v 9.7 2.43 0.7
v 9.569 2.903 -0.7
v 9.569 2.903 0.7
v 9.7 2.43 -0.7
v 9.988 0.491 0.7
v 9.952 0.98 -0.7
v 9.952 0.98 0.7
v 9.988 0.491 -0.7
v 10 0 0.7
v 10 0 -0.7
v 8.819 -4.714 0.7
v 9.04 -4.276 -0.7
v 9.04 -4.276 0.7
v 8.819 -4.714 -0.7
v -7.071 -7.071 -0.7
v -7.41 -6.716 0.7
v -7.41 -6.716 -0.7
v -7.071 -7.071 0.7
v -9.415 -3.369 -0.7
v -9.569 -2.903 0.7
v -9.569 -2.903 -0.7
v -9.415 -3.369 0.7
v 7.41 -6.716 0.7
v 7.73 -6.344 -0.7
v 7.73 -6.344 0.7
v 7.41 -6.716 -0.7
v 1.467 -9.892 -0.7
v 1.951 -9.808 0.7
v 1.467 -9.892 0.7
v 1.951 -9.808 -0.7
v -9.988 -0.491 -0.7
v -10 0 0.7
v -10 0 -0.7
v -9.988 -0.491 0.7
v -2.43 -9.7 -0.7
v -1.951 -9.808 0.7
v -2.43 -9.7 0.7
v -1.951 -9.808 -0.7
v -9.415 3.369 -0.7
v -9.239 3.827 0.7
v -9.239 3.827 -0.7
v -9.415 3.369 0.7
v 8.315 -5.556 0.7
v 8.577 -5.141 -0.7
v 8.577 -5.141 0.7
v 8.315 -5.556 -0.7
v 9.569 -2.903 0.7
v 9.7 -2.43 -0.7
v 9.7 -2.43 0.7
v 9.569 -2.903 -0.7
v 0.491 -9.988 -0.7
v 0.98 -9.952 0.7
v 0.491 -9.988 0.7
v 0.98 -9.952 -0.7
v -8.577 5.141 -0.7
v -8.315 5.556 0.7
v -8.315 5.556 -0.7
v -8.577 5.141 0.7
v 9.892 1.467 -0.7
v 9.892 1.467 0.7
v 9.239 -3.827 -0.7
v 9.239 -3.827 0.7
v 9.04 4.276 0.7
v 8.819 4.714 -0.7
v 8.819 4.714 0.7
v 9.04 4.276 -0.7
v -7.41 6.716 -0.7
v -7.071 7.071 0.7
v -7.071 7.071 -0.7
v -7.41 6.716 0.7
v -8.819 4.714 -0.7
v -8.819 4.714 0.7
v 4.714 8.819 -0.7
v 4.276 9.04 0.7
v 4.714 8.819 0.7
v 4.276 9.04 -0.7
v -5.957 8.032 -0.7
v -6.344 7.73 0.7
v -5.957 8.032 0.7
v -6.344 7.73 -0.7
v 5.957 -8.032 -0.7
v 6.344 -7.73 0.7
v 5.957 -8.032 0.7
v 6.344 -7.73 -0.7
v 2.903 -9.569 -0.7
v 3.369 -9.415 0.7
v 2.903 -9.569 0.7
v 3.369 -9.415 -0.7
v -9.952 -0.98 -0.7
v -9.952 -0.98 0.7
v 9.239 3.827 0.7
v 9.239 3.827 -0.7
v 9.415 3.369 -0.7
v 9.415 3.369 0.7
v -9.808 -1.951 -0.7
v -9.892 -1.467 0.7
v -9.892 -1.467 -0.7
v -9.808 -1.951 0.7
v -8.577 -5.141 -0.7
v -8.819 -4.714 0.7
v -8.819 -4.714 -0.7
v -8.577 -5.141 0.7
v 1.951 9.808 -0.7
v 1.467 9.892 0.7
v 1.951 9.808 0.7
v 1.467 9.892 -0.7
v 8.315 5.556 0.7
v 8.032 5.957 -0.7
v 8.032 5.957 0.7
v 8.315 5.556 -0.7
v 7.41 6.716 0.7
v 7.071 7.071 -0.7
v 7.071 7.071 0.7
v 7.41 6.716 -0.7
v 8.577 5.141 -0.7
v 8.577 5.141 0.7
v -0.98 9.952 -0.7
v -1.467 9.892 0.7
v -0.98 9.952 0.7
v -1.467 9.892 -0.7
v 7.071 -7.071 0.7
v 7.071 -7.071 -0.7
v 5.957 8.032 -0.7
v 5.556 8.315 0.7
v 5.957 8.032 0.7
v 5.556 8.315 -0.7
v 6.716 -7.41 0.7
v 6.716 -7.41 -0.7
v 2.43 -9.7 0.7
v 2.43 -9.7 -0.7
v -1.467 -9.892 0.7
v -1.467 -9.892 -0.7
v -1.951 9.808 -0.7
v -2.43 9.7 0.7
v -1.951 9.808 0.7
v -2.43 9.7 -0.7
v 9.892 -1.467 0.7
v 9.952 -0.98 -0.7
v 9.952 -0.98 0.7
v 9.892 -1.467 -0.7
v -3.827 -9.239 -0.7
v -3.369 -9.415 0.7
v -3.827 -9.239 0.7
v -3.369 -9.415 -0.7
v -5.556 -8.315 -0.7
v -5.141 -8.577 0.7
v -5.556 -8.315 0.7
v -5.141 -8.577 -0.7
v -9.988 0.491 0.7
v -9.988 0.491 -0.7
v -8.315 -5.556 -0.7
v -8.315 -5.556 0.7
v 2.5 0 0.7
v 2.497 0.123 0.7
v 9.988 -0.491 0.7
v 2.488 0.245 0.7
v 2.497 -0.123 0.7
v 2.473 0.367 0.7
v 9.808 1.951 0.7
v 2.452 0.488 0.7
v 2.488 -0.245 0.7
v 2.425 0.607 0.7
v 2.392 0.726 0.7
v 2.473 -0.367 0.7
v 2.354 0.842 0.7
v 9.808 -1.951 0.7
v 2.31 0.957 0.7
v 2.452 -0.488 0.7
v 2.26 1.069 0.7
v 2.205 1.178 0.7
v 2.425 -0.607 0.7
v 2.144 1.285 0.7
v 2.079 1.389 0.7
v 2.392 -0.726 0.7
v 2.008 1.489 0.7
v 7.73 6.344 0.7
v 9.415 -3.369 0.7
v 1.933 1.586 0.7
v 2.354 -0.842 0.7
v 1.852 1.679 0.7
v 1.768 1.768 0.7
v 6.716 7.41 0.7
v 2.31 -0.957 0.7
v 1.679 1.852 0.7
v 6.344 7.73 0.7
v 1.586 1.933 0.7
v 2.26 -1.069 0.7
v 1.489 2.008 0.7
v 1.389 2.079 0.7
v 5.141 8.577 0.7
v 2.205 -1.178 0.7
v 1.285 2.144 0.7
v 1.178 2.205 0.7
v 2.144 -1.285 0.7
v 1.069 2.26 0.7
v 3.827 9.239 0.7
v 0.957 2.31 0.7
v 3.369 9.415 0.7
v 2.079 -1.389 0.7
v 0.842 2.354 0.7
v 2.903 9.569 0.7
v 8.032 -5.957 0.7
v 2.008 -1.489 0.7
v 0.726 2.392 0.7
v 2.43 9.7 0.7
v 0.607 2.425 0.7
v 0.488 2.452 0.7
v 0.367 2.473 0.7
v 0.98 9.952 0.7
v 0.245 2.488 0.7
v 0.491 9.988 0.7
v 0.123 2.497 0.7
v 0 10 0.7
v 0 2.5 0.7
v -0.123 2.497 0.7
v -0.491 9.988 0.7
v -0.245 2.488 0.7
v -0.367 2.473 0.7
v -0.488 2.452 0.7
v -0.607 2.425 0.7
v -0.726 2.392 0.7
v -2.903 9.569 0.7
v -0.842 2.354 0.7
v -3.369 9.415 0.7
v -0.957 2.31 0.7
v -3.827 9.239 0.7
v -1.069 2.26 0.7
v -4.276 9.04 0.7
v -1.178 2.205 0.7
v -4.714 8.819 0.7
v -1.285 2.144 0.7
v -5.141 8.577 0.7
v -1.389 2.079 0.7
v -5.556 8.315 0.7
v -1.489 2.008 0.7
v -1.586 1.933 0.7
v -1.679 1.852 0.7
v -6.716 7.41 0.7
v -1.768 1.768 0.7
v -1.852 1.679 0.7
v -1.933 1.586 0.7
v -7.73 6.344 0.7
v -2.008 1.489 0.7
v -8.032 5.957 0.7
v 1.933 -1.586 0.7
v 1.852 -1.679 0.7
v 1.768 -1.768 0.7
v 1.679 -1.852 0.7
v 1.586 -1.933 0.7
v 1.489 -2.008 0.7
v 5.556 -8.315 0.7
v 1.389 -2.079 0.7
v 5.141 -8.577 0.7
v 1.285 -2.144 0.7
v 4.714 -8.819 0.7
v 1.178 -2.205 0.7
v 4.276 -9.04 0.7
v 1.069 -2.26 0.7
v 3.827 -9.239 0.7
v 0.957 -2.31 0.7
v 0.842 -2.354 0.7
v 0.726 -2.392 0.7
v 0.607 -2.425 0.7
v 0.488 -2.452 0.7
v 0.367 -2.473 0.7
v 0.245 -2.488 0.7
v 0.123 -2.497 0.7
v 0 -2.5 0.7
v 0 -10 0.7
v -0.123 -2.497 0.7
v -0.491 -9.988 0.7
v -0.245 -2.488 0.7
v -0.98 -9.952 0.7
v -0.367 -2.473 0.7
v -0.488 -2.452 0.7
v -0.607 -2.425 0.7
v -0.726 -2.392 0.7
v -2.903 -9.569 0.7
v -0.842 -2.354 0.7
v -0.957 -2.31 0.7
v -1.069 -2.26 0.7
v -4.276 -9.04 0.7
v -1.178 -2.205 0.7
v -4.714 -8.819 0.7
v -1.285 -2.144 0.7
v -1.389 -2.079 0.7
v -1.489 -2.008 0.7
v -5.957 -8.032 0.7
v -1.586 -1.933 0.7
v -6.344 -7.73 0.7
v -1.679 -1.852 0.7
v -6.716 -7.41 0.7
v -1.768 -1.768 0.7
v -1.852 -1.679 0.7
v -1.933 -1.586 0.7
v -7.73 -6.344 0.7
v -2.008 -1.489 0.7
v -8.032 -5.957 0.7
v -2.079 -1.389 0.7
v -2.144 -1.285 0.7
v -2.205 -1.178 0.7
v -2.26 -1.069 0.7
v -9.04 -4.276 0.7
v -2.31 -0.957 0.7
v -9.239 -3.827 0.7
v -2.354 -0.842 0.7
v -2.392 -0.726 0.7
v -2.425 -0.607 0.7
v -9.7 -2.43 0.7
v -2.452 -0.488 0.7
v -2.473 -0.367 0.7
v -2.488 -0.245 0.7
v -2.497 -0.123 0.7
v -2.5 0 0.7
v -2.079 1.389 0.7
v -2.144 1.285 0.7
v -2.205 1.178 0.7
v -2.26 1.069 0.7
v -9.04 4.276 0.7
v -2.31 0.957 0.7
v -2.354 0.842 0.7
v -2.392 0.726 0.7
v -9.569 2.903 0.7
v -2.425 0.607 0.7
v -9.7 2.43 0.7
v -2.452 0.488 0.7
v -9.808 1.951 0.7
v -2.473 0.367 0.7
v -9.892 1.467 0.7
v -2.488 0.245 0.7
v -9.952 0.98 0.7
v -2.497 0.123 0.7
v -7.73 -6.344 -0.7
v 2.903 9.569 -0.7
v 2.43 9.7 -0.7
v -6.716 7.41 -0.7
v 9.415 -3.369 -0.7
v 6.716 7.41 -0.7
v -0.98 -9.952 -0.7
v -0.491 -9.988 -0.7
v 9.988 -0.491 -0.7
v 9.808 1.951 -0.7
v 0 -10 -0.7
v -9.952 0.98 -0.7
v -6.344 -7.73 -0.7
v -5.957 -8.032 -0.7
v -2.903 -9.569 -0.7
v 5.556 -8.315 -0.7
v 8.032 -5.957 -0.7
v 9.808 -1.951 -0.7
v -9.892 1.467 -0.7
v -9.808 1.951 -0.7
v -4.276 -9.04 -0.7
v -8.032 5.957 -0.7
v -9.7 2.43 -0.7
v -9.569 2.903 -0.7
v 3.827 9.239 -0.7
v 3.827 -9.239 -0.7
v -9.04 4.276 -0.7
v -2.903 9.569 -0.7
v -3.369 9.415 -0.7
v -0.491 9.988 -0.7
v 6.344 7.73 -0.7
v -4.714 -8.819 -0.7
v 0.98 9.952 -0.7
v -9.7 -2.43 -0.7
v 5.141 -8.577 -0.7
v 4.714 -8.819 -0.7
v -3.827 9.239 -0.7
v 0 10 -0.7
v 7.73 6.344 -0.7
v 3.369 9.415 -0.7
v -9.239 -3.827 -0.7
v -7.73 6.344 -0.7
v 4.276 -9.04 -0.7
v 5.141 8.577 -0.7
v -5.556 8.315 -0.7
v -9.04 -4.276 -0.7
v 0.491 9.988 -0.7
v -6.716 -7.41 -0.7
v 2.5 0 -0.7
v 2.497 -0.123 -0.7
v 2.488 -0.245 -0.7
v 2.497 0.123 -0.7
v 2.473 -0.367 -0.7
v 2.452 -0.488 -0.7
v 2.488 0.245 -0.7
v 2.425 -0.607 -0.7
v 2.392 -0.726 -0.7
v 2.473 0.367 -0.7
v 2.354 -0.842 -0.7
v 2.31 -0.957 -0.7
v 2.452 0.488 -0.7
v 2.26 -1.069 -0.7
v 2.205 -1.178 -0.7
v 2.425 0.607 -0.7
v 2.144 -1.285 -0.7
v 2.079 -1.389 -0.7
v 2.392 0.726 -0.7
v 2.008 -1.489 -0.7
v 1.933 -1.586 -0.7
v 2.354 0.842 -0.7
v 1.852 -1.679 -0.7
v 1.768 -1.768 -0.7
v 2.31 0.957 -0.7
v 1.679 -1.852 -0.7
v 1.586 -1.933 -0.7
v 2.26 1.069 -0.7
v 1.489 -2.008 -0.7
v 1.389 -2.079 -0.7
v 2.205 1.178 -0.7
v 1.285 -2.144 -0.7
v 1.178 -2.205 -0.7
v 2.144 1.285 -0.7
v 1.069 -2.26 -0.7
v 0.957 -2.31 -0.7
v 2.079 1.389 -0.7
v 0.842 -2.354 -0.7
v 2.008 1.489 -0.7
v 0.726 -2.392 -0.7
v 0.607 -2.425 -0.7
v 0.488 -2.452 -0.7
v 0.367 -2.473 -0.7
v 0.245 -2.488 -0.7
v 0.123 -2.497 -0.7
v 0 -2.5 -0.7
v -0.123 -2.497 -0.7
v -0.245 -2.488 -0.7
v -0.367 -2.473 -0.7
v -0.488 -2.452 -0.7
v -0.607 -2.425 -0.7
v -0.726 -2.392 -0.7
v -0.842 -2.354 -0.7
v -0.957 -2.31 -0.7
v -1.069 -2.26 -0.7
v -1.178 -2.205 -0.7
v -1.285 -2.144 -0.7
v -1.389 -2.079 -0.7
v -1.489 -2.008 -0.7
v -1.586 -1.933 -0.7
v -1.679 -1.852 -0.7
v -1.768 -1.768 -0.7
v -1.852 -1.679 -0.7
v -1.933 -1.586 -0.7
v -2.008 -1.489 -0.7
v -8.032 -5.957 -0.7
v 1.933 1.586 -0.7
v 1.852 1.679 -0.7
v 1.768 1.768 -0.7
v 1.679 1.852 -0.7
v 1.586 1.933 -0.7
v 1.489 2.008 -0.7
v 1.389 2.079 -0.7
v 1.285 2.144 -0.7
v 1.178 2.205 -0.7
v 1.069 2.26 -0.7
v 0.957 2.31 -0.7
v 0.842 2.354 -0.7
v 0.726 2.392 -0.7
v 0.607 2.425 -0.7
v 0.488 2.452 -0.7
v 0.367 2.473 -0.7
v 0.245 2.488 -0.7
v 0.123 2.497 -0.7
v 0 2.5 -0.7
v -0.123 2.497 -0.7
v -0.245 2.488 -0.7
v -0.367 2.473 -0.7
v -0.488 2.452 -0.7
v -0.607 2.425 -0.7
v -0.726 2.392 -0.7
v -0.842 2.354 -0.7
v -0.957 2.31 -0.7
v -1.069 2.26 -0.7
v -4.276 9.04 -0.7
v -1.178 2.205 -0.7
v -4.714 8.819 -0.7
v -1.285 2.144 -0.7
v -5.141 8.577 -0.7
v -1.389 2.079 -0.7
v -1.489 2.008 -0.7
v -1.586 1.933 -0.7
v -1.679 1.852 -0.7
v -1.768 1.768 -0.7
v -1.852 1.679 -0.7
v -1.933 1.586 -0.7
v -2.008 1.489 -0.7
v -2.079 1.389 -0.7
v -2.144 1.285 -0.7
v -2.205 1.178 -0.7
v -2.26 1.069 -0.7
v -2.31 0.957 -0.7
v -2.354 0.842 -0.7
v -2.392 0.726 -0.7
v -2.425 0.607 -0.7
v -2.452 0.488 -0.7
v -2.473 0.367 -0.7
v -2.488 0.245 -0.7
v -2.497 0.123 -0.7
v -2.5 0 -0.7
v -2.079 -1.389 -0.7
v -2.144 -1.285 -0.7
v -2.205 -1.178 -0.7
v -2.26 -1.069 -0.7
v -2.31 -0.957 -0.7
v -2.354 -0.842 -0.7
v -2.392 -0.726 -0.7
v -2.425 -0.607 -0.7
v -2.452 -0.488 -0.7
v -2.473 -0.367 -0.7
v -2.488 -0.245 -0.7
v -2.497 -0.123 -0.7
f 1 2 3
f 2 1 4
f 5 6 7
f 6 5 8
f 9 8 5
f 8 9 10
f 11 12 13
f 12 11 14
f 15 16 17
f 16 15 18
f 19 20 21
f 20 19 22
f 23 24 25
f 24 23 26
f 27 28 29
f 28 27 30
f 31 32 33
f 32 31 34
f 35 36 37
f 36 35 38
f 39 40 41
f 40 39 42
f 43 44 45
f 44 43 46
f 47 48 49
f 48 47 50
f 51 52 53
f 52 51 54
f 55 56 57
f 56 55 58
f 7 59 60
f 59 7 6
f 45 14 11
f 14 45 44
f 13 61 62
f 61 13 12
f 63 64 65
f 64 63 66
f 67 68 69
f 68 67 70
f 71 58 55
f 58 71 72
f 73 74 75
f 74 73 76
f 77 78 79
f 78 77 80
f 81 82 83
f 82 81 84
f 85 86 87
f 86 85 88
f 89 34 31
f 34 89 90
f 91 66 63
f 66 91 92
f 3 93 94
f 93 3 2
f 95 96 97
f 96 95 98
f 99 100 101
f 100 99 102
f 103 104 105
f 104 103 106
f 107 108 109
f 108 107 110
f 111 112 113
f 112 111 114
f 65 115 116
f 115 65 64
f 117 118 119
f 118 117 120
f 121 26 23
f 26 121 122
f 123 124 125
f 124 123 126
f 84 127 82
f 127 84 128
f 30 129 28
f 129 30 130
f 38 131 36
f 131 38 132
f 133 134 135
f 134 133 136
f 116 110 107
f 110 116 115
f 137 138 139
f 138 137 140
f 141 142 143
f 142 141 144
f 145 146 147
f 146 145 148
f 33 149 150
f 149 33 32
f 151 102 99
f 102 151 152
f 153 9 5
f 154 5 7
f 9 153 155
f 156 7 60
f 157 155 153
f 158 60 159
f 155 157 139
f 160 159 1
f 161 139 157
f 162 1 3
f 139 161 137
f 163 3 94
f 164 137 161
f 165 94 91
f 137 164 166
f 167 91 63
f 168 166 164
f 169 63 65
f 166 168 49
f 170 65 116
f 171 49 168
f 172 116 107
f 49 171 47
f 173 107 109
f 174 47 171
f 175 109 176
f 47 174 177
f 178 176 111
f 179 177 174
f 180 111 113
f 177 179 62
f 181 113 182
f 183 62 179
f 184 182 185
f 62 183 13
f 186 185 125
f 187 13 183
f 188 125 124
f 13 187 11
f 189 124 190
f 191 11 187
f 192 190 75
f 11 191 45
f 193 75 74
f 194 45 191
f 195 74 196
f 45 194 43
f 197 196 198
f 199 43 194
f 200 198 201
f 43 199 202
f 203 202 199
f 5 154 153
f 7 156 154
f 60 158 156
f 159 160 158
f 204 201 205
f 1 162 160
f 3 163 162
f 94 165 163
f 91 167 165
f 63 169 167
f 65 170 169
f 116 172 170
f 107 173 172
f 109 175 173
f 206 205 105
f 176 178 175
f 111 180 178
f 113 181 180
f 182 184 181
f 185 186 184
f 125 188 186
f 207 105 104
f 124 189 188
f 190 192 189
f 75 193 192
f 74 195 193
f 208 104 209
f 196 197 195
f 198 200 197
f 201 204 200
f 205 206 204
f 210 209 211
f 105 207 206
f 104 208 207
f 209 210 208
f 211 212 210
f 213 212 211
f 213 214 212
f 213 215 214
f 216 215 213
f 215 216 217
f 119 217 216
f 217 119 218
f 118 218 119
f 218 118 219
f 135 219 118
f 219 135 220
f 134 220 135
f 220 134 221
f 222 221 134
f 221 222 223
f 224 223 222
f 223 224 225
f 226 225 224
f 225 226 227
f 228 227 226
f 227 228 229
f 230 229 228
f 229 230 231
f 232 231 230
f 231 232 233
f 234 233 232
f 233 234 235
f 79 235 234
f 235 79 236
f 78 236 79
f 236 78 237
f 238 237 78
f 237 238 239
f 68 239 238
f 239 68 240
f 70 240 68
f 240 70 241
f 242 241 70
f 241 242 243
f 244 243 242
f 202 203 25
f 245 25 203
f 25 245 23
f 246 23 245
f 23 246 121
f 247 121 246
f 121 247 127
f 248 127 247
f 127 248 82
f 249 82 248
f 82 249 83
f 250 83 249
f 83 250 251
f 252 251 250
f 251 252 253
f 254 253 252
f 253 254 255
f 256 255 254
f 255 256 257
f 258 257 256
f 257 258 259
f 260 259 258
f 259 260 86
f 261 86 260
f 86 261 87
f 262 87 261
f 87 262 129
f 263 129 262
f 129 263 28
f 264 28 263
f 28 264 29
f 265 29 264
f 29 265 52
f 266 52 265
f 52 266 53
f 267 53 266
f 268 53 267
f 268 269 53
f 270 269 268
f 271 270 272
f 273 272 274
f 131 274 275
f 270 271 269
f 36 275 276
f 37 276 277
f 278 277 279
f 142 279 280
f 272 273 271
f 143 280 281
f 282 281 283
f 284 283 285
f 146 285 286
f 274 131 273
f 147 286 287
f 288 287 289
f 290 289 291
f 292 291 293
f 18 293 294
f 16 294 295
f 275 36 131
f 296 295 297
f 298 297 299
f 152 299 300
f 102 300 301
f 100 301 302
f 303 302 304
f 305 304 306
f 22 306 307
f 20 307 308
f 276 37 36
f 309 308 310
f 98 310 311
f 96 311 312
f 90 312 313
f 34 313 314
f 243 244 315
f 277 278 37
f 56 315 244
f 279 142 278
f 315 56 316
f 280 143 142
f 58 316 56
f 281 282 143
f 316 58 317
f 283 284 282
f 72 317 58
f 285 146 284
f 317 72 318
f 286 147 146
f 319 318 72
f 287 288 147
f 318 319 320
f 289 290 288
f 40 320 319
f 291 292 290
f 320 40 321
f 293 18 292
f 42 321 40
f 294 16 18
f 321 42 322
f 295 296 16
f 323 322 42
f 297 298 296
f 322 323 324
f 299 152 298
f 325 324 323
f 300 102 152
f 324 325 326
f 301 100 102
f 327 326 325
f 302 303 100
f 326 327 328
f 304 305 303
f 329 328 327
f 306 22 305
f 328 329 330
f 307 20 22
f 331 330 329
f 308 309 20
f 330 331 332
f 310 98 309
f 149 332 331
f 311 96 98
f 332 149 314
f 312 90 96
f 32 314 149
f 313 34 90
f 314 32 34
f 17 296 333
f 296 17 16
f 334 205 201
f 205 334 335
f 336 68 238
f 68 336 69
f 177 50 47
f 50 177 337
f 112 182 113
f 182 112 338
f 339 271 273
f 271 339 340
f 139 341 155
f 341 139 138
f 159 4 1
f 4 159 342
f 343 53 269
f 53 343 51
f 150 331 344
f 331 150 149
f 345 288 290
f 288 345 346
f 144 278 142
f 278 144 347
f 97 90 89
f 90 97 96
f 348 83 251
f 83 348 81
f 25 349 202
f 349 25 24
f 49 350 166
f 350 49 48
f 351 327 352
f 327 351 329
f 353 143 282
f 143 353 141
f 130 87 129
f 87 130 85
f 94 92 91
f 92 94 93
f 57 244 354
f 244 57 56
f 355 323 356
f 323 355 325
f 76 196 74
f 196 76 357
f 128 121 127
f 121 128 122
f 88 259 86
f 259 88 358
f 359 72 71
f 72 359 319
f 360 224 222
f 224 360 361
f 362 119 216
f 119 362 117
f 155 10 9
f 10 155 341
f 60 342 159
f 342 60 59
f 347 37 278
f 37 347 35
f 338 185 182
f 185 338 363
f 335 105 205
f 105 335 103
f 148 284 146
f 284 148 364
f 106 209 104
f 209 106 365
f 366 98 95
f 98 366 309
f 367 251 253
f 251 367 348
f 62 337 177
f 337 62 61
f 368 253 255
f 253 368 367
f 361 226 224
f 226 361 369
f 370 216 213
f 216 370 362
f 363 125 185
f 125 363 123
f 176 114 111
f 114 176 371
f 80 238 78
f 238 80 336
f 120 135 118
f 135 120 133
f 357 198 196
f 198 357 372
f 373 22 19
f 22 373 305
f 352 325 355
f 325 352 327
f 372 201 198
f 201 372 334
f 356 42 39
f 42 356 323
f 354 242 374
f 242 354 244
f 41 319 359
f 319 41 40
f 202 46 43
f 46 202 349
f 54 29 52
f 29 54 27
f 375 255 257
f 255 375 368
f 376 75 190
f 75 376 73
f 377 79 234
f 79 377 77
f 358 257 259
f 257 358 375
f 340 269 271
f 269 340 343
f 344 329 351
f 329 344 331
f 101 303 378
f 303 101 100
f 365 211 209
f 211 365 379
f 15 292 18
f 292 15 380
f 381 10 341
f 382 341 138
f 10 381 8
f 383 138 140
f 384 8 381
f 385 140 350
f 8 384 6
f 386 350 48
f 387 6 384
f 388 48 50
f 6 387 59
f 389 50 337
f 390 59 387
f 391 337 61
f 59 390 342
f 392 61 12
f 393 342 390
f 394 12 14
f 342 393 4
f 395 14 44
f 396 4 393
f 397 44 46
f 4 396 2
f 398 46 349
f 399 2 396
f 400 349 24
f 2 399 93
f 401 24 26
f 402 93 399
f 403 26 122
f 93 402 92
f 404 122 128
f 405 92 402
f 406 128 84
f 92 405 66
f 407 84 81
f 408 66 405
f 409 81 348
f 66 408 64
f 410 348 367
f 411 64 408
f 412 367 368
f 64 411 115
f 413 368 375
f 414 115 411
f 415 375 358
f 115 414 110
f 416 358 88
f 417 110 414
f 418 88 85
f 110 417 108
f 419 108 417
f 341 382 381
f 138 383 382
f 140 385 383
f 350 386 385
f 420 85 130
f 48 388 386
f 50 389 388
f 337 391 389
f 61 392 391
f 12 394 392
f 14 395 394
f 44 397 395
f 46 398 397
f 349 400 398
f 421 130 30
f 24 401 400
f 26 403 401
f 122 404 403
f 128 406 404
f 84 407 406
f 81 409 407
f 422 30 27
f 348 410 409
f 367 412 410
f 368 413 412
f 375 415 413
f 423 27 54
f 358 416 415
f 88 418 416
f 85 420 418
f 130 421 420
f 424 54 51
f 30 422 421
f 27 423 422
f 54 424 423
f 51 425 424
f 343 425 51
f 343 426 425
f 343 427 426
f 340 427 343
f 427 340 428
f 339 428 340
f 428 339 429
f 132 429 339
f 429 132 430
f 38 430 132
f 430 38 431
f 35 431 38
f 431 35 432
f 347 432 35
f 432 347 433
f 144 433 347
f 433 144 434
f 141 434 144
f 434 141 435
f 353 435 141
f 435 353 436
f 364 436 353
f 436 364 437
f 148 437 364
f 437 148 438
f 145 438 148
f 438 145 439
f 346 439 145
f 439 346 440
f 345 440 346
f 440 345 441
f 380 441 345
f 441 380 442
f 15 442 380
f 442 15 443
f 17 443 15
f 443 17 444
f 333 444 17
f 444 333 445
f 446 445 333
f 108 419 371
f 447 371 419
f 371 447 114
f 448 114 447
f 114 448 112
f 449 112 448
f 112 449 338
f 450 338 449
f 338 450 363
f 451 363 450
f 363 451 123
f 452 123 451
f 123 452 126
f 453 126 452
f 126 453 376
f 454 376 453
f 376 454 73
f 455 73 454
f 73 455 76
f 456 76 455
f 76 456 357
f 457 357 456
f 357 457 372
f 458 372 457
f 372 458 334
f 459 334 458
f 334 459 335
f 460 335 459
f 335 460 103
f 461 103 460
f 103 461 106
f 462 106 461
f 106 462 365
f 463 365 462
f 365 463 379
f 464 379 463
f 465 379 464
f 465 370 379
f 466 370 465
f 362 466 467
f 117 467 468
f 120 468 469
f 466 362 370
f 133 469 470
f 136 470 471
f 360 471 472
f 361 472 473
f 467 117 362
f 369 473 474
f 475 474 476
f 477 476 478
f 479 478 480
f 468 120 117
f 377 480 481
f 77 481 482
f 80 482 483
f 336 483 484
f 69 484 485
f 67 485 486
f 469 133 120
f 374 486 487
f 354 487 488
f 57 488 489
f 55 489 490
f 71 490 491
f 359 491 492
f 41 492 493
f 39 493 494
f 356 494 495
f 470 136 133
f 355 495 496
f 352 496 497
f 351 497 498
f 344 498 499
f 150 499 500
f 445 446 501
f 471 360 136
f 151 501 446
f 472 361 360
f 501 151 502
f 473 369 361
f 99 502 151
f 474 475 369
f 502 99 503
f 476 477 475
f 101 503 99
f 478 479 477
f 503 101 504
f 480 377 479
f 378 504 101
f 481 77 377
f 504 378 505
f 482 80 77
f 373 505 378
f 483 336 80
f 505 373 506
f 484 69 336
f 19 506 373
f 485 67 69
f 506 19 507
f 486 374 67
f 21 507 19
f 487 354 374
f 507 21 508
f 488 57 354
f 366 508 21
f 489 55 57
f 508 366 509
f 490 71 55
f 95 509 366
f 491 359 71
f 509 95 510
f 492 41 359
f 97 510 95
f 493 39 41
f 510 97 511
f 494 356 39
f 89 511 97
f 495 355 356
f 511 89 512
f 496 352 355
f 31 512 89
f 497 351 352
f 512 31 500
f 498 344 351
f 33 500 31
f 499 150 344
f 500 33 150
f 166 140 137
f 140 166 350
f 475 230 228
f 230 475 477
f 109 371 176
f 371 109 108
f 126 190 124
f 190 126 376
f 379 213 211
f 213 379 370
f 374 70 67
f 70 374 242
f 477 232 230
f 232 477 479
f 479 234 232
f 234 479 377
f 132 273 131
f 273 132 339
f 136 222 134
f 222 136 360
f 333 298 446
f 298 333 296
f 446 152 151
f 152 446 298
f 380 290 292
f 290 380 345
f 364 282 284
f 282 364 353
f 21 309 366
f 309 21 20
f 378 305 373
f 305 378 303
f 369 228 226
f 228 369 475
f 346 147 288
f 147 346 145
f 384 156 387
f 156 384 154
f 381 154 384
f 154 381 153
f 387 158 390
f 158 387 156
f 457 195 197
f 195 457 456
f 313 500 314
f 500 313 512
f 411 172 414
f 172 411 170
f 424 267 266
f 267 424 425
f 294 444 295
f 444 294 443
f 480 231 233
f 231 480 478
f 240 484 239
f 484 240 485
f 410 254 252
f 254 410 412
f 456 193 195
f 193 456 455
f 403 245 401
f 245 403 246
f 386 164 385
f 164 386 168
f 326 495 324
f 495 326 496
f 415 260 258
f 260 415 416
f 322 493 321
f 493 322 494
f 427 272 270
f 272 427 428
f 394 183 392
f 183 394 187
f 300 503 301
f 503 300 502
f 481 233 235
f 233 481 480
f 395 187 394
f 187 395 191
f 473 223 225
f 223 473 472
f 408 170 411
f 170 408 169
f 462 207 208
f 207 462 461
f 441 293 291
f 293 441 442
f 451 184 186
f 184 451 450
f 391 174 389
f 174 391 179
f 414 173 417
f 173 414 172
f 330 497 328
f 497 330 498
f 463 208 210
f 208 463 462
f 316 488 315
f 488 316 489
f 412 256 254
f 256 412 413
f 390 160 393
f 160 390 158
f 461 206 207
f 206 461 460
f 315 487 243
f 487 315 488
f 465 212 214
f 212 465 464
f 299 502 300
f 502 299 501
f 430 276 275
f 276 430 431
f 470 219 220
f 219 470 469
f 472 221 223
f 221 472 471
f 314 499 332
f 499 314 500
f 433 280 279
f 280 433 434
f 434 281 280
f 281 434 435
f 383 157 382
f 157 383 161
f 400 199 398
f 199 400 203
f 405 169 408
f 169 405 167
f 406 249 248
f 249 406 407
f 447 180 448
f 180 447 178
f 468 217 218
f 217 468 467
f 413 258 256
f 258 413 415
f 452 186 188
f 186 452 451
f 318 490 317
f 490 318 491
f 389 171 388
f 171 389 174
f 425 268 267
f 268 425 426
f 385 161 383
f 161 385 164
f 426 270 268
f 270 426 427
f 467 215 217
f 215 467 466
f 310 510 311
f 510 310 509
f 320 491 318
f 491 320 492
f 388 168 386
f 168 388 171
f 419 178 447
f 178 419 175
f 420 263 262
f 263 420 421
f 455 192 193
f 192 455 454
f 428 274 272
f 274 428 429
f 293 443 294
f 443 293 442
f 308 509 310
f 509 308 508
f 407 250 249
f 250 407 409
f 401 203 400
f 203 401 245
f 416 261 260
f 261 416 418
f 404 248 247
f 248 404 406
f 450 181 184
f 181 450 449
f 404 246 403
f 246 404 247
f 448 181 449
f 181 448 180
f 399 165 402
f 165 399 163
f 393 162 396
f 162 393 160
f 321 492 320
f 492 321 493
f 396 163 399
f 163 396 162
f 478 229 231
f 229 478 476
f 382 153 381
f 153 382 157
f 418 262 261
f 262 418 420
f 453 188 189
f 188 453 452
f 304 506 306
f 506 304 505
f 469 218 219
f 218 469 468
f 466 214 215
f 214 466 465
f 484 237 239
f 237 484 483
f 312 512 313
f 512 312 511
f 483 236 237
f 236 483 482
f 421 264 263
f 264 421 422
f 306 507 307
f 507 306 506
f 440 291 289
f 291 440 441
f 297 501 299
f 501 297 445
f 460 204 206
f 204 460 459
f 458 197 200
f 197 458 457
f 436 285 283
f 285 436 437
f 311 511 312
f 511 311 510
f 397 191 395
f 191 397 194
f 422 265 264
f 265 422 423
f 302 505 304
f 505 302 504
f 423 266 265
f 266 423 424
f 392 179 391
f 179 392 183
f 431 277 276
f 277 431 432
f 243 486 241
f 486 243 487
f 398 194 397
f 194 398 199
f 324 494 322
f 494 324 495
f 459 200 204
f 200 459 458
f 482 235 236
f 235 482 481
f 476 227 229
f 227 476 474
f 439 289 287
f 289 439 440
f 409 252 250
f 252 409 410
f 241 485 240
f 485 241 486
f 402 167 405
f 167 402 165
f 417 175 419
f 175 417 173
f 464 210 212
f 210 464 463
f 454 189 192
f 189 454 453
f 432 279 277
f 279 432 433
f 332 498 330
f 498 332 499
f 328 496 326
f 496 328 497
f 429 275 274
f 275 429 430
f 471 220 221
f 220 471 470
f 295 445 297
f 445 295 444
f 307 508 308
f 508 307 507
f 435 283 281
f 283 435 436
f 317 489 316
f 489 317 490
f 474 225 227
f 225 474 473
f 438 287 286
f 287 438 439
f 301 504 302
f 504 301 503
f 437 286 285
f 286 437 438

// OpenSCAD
// Penny washer parameters (mm)
inner_diameter_mm = 5.0;
outer_diameter_mm = 20.0;
thickness_mm      = 1.4;

// Small epsilon for robust boolean ops
eps_mm = 0.05;

$fn = 128;

// Single-part penny washer
difference() {
    cylinder(d = outer_diameter_mm, h = thickness_mm, center = true);
    cylinder(d = inner_diameter_mm, h = thickness_mm + 2*eps_mm, center = true);
}
